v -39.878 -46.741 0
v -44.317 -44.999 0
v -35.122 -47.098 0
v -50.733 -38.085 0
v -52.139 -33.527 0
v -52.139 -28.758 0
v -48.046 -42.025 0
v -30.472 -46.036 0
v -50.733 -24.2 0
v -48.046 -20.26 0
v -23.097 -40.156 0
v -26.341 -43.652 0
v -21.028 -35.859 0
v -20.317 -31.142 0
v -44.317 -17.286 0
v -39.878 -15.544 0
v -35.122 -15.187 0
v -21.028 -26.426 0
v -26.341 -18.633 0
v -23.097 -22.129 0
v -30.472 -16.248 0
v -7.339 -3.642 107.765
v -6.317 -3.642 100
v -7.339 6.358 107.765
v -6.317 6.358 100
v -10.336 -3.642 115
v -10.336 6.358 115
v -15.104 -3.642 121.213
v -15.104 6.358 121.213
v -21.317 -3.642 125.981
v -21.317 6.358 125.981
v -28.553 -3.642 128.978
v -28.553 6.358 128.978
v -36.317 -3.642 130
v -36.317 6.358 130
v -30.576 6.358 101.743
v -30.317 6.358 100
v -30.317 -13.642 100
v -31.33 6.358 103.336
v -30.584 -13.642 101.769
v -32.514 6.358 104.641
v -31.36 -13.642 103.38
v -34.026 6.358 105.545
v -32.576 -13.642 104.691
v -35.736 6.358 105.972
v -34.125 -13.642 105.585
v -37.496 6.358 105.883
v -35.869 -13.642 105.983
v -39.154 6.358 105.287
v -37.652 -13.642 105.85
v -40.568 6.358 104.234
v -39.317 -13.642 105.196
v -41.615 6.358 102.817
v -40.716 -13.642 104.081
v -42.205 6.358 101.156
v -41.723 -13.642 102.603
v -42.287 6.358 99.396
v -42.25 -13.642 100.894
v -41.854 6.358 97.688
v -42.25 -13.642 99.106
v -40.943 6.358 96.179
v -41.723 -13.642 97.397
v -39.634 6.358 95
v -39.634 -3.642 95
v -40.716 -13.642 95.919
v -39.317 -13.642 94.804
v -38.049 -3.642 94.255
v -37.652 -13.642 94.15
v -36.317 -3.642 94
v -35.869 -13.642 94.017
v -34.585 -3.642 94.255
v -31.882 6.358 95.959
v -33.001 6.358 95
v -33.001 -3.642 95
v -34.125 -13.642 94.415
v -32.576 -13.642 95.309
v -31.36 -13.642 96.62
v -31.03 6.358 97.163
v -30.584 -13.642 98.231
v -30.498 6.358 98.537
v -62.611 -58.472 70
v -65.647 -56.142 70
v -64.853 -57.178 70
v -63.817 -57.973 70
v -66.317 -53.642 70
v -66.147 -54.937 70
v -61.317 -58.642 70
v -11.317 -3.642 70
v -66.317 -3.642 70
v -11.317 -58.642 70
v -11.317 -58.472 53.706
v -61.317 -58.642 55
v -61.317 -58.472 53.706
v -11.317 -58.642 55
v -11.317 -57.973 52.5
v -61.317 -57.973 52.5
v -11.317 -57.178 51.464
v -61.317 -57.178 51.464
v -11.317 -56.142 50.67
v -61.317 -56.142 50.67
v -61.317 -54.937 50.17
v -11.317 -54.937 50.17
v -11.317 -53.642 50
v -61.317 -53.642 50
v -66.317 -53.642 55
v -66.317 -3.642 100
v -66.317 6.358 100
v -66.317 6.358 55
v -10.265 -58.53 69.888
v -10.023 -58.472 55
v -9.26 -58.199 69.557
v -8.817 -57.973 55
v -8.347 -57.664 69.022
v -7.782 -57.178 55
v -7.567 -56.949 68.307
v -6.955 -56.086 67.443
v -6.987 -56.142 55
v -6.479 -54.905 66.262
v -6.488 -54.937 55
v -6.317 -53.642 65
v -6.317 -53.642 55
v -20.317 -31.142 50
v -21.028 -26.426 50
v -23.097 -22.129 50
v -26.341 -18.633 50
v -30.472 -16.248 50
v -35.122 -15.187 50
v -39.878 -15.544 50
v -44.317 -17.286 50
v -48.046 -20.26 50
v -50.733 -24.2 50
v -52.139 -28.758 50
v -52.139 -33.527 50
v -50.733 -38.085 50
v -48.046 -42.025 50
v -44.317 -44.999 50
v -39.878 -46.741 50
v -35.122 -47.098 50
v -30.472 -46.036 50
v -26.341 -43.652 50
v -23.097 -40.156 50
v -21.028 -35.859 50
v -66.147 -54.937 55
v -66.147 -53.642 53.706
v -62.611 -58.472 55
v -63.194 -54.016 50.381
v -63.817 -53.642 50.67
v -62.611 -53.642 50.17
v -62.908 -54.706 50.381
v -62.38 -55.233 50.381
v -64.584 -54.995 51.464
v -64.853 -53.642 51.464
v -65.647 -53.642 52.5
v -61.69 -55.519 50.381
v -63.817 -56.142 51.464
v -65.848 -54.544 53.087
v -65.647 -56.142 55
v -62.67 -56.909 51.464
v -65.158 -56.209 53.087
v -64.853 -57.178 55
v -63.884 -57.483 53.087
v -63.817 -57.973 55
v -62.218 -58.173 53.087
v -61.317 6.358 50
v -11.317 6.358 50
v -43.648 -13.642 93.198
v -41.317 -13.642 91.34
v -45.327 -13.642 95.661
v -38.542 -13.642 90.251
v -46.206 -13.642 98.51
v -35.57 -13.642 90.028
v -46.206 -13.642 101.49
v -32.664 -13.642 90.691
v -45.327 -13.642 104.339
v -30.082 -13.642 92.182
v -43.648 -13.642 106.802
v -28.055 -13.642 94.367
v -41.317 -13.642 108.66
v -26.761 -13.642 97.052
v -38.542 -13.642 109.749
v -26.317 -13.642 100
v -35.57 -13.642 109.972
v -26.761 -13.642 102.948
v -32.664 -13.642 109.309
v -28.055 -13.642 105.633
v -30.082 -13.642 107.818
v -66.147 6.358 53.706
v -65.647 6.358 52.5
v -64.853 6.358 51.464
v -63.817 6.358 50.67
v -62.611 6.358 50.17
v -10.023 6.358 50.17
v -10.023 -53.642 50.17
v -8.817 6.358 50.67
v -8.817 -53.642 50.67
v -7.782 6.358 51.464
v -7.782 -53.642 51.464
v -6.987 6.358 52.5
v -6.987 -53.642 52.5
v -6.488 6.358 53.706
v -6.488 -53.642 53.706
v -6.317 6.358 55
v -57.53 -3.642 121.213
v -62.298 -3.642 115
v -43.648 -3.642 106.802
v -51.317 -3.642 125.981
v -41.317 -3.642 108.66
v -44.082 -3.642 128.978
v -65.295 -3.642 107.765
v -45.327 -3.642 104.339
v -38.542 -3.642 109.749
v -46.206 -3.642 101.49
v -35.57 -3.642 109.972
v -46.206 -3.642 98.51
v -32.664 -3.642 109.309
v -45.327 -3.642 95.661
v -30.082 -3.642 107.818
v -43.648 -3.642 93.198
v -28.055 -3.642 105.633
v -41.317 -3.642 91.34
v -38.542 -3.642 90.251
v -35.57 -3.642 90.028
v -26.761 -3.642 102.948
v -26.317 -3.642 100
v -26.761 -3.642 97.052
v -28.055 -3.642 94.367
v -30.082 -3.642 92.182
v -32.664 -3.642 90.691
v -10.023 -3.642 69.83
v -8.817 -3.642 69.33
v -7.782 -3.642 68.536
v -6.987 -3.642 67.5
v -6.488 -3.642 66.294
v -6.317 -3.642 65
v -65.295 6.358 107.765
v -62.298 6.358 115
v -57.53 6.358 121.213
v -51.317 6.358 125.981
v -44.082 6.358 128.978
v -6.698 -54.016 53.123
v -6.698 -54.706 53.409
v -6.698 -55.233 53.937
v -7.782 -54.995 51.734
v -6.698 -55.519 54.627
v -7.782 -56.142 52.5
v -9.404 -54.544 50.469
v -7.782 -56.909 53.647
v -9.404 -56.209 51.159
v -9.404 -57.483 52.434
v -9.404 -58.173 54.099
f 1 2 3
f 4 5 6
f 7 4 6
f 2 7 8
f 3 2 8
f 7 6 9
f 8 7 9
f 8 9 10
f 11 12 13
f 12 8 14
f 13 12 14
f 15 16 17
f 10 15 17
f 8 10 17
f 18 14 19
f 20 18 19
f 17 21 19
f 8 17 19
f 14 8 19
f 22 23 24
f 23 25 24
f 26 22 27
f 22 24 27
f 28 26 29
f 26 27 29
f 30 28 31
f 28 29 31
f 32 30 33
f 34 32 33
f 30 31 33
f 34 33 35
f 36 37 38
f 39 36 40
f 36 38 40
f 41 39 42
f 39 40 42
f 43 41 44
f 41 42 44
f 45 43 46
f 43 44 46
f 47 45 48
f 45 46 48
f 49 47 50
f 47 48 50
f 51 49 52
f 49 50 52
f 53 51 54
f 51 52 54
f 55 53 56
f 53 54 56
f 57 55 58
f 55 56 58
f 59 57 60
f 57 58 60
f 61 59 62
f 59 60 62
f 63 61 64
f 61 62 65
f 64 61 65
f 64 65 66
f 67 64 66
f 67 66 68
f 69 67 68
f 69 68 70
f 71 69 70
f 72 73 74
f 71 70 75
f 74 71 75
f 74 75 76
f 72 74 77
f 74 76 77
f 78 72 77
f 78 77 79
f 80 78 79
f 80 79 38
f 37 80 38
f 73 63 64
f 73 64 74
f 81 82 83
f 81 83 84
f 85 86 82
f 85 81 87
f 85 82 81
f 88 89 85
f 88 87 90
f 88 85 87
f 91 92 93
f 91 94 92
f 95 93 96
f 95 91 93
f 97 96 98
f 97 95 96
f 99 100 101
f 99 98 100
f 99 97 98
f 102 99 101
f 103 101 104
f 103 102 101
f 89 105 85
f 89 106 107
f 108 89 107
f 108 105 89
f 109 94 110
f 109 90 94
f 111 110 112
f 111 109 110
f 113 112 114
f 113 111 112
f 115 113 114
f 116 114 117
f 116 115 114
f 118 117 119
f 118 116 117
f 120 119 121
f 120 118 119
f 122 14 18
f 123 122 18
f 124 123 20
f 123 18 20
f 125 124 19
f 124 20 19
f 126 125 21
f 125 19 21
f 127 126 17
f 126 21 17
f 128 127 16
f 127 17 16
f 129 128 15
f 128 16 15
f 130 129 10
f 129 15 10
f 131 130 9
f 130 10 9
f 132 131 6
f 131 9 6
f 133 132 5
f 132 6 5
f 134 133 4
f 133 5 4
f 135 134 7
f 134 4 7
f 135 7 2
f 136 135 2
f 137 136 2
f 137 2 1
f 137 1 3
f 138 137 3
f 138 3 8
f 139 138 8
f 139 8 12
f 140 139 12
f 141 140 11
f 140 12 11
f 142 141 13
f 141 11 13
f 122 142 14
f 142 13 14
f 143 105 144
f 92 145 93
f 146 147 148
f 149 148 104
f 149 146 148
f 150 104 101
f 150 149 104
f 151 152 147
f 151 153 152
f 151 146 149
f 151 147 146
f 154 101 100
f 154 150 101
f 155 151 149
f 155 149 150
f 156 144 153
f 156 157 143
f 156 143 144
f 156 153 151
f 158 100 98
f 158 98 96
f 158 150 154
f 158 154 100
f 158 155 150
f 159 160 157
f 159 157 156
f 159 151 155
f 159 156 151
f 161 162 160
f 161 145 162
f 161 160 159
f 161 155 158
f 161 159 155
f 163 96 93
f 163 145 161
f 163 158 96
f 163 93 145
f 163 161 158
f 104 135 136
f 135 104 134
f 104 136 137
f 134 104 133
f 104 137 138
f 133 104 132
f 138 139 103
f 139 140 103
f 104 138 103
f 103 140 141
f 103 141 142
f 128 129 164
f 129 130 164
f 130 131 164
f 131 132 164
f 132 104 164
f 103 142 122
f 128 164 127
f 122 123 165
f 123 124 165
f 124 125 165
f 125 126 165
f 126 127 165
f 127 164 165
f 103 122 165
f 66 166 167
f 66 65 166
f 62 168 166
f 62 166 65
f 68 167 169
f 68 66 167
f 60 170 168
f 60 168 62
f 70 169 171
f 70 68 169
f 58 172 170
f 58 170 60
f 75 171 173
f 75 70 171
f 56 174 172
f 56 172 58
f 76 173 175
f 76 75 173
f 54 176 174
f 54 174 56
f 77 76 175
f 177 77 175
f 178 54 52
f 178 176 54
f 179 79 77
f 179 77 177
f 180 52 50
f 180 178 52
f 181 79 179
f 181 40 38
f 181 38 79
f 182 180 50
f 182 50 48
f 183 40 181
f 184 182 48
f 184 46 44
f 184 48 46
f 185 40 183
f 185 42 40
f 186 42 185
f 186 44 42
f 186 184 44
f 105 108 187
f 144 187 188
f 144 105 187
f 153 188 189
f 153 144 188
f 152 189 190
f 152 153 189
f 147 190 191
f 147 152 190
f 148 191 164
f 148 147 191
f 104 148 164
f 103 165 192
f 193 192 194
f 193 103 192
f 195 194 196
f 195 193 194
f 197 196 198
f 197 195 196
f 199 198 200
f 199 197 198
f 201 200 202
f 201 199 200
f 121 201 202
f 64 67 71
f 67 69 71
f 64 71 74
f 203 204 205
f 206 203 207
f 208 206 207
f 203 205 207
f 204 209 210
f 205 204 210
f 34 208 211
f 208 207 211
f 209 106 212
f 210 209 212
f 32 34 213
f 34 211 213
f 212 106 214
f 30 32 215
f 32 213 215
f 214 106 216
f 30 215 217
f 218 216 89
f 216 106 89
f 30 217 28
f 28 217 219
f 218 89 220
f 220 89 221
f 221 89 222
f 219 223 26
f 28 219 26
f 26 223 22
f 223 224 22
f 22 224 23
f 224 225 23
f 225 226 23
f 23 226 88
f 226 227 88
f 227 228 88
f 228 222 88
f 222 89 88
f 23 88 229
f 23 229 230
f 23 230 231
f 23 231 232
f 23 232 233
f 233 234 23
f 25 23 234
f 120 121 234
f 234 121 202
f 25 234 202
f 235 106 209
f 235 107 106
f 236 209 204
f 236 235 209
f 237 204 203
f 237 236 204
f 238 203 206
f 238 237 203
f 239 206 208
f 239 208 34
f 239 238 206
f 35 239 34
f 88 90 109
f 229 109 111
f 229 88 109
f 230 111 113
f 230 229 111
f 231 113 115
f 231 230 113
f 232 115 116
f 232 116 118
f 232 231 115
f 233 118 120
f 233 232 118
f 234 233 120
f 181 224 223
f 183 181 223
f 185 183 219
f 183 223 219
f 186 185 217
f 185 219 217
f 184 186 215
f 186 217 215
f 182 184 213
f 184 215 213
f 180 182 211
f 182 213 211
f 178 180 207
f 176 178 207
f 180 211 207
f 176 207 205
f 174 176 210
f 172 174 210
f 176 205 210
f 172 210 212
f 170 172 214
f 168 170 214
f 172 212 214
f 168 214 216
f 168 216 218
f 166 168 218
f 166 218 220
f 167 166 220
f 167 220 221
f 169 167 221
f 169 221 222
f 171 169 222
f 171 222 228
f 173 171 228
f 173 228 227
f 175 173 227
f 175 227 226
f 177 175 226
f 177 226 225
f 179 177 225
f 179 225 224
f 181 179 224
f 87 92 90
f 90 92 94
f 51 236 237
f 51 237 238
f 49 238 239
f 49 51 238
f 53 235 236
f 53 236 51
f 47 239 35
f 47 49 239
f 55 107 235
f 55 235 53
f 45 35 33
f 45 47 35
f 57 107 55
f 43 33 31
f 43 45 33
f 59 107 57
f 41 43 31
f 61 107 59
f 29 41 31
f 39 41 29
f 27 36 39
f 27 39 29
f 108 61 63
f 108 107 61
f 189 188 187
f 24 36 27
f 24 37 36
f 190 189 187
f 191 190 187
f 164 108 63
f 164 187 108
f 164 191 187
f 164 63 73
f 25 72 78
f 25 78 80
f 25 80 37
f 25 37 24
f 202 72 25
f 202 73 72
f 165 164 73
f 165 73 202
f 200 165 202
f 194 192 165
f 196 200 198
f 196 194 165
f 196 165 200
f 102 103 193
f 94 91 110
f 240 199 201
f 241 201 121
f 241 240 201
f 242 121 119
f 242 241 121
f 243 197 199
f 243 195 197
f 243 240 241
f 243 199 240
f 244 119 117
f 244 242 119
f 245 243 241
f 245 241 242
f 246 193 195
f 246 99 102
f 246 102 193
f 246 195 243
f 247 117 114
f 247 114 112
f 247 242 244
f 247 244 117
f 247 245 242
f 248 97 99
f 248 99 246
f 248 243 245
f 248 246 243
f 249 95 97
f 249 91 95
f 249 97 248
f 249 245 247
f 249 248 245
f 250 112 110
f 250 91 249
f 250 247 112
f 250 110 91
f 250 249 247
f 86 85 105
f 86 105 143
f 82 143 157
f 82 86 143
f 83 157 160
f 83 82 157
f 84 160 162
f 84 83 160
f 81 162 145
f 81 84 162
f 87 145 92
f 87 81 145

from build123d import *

# Parameters (mm, degrees)
F0_R      = 16
F1_DEPTH  = 50
F3_DEPTH  = 20
F4_W      = 60
F4_H      = 10
F5_DEPTH  = 20
F6_W      = 60
F6_H      = 10
F7_DEPTH  = 60
F8_R      = 29.99999
F9_R      = 10
F10_DEPTH = 10
F11_R     = 6
F12_DEPTH = 20.001
F14_R     = 5
F15_DEPTH = 25


# Not quite as in the source:
# - a fillet or chamfer is up to 0.001 mm smaller than in the source, because OpenCascade refuses the exact size


with BuildPart() as f1:
    # F0 (on Top) → F1 (new body)
    with BuildSketch(Plane.XY):
        with Locations((-36.3172069192, -31.1424750835)):
            Circle(F0_R)
    extrude(amount=F1_DEPTH)

    # F2 (on face) → F3 (join)
    with BuildSketch(Plane.XY.offset(50)):
        Polygon((-66.3172069192, -3.6424750835), (-66.3172069192, -31.1424750835), (-66.3172069192, -58.6424750835), (-36.3172069192, -58.6424750835), (-6.3172069192, -58.6424750835), (-6.3172069192, -31.1424750835), (-6.3172069192, -3.6424750835), (-36.3172069192, -3.6424750835), align=None)
    extrude(amount=F3_DEPTH)

    # F4 (on face) → F5 (join)
    with BuildSketch(Plane.XY.offset(70)):
        with Locations((-36.3172069192, 1.3575249165)):
            Rectangle(F4_W, F4_H)
    extrude(amount=-F5_DEPTH)

    # F6 (on face) → F7 (join)
    with BuildSketch(Plane.XY.offset(70)):
        with Locations((-36.3172069192, 1.3575249165)):
            Rectangle(F6_W, F6_H)
    extrude(amount=F7_DEPTH)

    # F8 (radius 30 in the source; OpenCascade refuses exactly that, so slightly less here)
    f8_edges = [f1.edges().sort_by_distance(p)[0] for p in [
        (-66.317207, 1.357525, 130),
        (-6.317207, 1.357525, 130),
    ]]
    fillet(f8_edges, radius=F8_R)

    # F9 (on face) → F10 (join)
    with BuildSketch(Plane.XZ.offset(3.6424750835)):
        with Locations((-36.3172069192, 100)):
            Circle(F9_R)
    extrude(amount=F10_DEPTH)

    # F11 (on face) → F12 (cut, through all)
    with BuildSketch(Plane.XZ.offset(13.6424750835)):
        with Locations((-36.3172069192, 100)):
            Circle(F11_R)
    extrude(amount=-F12_DEPTH, mode=Mode.SUBTRACT)

    # F14
    f14_edges = [f1.edges().sort_by_distance(p)[0] for p in [
        (-66.317207, -58.642475, 60),
        (-66.317207, -26.142475, 50),
        (-36.317207, -58.642475, 50),
        (-6.317207, -26.142475, 50),
        (-6.317207, -58.642475, 60),
        (-6.317207, -31.142475, 70),
    ]]
    fillet(f14_edges, radius=F14_R)

    # F6 (on face) → F15 (join)
    with BuildSketch(Plane.XY.offset(70)):
        with Locations((-36.3172069192, 1.3575249165)):
            Rectangle(F6_W, F6_H)
    extrude(amount=F15_DEPTH)


solid = f1.part
